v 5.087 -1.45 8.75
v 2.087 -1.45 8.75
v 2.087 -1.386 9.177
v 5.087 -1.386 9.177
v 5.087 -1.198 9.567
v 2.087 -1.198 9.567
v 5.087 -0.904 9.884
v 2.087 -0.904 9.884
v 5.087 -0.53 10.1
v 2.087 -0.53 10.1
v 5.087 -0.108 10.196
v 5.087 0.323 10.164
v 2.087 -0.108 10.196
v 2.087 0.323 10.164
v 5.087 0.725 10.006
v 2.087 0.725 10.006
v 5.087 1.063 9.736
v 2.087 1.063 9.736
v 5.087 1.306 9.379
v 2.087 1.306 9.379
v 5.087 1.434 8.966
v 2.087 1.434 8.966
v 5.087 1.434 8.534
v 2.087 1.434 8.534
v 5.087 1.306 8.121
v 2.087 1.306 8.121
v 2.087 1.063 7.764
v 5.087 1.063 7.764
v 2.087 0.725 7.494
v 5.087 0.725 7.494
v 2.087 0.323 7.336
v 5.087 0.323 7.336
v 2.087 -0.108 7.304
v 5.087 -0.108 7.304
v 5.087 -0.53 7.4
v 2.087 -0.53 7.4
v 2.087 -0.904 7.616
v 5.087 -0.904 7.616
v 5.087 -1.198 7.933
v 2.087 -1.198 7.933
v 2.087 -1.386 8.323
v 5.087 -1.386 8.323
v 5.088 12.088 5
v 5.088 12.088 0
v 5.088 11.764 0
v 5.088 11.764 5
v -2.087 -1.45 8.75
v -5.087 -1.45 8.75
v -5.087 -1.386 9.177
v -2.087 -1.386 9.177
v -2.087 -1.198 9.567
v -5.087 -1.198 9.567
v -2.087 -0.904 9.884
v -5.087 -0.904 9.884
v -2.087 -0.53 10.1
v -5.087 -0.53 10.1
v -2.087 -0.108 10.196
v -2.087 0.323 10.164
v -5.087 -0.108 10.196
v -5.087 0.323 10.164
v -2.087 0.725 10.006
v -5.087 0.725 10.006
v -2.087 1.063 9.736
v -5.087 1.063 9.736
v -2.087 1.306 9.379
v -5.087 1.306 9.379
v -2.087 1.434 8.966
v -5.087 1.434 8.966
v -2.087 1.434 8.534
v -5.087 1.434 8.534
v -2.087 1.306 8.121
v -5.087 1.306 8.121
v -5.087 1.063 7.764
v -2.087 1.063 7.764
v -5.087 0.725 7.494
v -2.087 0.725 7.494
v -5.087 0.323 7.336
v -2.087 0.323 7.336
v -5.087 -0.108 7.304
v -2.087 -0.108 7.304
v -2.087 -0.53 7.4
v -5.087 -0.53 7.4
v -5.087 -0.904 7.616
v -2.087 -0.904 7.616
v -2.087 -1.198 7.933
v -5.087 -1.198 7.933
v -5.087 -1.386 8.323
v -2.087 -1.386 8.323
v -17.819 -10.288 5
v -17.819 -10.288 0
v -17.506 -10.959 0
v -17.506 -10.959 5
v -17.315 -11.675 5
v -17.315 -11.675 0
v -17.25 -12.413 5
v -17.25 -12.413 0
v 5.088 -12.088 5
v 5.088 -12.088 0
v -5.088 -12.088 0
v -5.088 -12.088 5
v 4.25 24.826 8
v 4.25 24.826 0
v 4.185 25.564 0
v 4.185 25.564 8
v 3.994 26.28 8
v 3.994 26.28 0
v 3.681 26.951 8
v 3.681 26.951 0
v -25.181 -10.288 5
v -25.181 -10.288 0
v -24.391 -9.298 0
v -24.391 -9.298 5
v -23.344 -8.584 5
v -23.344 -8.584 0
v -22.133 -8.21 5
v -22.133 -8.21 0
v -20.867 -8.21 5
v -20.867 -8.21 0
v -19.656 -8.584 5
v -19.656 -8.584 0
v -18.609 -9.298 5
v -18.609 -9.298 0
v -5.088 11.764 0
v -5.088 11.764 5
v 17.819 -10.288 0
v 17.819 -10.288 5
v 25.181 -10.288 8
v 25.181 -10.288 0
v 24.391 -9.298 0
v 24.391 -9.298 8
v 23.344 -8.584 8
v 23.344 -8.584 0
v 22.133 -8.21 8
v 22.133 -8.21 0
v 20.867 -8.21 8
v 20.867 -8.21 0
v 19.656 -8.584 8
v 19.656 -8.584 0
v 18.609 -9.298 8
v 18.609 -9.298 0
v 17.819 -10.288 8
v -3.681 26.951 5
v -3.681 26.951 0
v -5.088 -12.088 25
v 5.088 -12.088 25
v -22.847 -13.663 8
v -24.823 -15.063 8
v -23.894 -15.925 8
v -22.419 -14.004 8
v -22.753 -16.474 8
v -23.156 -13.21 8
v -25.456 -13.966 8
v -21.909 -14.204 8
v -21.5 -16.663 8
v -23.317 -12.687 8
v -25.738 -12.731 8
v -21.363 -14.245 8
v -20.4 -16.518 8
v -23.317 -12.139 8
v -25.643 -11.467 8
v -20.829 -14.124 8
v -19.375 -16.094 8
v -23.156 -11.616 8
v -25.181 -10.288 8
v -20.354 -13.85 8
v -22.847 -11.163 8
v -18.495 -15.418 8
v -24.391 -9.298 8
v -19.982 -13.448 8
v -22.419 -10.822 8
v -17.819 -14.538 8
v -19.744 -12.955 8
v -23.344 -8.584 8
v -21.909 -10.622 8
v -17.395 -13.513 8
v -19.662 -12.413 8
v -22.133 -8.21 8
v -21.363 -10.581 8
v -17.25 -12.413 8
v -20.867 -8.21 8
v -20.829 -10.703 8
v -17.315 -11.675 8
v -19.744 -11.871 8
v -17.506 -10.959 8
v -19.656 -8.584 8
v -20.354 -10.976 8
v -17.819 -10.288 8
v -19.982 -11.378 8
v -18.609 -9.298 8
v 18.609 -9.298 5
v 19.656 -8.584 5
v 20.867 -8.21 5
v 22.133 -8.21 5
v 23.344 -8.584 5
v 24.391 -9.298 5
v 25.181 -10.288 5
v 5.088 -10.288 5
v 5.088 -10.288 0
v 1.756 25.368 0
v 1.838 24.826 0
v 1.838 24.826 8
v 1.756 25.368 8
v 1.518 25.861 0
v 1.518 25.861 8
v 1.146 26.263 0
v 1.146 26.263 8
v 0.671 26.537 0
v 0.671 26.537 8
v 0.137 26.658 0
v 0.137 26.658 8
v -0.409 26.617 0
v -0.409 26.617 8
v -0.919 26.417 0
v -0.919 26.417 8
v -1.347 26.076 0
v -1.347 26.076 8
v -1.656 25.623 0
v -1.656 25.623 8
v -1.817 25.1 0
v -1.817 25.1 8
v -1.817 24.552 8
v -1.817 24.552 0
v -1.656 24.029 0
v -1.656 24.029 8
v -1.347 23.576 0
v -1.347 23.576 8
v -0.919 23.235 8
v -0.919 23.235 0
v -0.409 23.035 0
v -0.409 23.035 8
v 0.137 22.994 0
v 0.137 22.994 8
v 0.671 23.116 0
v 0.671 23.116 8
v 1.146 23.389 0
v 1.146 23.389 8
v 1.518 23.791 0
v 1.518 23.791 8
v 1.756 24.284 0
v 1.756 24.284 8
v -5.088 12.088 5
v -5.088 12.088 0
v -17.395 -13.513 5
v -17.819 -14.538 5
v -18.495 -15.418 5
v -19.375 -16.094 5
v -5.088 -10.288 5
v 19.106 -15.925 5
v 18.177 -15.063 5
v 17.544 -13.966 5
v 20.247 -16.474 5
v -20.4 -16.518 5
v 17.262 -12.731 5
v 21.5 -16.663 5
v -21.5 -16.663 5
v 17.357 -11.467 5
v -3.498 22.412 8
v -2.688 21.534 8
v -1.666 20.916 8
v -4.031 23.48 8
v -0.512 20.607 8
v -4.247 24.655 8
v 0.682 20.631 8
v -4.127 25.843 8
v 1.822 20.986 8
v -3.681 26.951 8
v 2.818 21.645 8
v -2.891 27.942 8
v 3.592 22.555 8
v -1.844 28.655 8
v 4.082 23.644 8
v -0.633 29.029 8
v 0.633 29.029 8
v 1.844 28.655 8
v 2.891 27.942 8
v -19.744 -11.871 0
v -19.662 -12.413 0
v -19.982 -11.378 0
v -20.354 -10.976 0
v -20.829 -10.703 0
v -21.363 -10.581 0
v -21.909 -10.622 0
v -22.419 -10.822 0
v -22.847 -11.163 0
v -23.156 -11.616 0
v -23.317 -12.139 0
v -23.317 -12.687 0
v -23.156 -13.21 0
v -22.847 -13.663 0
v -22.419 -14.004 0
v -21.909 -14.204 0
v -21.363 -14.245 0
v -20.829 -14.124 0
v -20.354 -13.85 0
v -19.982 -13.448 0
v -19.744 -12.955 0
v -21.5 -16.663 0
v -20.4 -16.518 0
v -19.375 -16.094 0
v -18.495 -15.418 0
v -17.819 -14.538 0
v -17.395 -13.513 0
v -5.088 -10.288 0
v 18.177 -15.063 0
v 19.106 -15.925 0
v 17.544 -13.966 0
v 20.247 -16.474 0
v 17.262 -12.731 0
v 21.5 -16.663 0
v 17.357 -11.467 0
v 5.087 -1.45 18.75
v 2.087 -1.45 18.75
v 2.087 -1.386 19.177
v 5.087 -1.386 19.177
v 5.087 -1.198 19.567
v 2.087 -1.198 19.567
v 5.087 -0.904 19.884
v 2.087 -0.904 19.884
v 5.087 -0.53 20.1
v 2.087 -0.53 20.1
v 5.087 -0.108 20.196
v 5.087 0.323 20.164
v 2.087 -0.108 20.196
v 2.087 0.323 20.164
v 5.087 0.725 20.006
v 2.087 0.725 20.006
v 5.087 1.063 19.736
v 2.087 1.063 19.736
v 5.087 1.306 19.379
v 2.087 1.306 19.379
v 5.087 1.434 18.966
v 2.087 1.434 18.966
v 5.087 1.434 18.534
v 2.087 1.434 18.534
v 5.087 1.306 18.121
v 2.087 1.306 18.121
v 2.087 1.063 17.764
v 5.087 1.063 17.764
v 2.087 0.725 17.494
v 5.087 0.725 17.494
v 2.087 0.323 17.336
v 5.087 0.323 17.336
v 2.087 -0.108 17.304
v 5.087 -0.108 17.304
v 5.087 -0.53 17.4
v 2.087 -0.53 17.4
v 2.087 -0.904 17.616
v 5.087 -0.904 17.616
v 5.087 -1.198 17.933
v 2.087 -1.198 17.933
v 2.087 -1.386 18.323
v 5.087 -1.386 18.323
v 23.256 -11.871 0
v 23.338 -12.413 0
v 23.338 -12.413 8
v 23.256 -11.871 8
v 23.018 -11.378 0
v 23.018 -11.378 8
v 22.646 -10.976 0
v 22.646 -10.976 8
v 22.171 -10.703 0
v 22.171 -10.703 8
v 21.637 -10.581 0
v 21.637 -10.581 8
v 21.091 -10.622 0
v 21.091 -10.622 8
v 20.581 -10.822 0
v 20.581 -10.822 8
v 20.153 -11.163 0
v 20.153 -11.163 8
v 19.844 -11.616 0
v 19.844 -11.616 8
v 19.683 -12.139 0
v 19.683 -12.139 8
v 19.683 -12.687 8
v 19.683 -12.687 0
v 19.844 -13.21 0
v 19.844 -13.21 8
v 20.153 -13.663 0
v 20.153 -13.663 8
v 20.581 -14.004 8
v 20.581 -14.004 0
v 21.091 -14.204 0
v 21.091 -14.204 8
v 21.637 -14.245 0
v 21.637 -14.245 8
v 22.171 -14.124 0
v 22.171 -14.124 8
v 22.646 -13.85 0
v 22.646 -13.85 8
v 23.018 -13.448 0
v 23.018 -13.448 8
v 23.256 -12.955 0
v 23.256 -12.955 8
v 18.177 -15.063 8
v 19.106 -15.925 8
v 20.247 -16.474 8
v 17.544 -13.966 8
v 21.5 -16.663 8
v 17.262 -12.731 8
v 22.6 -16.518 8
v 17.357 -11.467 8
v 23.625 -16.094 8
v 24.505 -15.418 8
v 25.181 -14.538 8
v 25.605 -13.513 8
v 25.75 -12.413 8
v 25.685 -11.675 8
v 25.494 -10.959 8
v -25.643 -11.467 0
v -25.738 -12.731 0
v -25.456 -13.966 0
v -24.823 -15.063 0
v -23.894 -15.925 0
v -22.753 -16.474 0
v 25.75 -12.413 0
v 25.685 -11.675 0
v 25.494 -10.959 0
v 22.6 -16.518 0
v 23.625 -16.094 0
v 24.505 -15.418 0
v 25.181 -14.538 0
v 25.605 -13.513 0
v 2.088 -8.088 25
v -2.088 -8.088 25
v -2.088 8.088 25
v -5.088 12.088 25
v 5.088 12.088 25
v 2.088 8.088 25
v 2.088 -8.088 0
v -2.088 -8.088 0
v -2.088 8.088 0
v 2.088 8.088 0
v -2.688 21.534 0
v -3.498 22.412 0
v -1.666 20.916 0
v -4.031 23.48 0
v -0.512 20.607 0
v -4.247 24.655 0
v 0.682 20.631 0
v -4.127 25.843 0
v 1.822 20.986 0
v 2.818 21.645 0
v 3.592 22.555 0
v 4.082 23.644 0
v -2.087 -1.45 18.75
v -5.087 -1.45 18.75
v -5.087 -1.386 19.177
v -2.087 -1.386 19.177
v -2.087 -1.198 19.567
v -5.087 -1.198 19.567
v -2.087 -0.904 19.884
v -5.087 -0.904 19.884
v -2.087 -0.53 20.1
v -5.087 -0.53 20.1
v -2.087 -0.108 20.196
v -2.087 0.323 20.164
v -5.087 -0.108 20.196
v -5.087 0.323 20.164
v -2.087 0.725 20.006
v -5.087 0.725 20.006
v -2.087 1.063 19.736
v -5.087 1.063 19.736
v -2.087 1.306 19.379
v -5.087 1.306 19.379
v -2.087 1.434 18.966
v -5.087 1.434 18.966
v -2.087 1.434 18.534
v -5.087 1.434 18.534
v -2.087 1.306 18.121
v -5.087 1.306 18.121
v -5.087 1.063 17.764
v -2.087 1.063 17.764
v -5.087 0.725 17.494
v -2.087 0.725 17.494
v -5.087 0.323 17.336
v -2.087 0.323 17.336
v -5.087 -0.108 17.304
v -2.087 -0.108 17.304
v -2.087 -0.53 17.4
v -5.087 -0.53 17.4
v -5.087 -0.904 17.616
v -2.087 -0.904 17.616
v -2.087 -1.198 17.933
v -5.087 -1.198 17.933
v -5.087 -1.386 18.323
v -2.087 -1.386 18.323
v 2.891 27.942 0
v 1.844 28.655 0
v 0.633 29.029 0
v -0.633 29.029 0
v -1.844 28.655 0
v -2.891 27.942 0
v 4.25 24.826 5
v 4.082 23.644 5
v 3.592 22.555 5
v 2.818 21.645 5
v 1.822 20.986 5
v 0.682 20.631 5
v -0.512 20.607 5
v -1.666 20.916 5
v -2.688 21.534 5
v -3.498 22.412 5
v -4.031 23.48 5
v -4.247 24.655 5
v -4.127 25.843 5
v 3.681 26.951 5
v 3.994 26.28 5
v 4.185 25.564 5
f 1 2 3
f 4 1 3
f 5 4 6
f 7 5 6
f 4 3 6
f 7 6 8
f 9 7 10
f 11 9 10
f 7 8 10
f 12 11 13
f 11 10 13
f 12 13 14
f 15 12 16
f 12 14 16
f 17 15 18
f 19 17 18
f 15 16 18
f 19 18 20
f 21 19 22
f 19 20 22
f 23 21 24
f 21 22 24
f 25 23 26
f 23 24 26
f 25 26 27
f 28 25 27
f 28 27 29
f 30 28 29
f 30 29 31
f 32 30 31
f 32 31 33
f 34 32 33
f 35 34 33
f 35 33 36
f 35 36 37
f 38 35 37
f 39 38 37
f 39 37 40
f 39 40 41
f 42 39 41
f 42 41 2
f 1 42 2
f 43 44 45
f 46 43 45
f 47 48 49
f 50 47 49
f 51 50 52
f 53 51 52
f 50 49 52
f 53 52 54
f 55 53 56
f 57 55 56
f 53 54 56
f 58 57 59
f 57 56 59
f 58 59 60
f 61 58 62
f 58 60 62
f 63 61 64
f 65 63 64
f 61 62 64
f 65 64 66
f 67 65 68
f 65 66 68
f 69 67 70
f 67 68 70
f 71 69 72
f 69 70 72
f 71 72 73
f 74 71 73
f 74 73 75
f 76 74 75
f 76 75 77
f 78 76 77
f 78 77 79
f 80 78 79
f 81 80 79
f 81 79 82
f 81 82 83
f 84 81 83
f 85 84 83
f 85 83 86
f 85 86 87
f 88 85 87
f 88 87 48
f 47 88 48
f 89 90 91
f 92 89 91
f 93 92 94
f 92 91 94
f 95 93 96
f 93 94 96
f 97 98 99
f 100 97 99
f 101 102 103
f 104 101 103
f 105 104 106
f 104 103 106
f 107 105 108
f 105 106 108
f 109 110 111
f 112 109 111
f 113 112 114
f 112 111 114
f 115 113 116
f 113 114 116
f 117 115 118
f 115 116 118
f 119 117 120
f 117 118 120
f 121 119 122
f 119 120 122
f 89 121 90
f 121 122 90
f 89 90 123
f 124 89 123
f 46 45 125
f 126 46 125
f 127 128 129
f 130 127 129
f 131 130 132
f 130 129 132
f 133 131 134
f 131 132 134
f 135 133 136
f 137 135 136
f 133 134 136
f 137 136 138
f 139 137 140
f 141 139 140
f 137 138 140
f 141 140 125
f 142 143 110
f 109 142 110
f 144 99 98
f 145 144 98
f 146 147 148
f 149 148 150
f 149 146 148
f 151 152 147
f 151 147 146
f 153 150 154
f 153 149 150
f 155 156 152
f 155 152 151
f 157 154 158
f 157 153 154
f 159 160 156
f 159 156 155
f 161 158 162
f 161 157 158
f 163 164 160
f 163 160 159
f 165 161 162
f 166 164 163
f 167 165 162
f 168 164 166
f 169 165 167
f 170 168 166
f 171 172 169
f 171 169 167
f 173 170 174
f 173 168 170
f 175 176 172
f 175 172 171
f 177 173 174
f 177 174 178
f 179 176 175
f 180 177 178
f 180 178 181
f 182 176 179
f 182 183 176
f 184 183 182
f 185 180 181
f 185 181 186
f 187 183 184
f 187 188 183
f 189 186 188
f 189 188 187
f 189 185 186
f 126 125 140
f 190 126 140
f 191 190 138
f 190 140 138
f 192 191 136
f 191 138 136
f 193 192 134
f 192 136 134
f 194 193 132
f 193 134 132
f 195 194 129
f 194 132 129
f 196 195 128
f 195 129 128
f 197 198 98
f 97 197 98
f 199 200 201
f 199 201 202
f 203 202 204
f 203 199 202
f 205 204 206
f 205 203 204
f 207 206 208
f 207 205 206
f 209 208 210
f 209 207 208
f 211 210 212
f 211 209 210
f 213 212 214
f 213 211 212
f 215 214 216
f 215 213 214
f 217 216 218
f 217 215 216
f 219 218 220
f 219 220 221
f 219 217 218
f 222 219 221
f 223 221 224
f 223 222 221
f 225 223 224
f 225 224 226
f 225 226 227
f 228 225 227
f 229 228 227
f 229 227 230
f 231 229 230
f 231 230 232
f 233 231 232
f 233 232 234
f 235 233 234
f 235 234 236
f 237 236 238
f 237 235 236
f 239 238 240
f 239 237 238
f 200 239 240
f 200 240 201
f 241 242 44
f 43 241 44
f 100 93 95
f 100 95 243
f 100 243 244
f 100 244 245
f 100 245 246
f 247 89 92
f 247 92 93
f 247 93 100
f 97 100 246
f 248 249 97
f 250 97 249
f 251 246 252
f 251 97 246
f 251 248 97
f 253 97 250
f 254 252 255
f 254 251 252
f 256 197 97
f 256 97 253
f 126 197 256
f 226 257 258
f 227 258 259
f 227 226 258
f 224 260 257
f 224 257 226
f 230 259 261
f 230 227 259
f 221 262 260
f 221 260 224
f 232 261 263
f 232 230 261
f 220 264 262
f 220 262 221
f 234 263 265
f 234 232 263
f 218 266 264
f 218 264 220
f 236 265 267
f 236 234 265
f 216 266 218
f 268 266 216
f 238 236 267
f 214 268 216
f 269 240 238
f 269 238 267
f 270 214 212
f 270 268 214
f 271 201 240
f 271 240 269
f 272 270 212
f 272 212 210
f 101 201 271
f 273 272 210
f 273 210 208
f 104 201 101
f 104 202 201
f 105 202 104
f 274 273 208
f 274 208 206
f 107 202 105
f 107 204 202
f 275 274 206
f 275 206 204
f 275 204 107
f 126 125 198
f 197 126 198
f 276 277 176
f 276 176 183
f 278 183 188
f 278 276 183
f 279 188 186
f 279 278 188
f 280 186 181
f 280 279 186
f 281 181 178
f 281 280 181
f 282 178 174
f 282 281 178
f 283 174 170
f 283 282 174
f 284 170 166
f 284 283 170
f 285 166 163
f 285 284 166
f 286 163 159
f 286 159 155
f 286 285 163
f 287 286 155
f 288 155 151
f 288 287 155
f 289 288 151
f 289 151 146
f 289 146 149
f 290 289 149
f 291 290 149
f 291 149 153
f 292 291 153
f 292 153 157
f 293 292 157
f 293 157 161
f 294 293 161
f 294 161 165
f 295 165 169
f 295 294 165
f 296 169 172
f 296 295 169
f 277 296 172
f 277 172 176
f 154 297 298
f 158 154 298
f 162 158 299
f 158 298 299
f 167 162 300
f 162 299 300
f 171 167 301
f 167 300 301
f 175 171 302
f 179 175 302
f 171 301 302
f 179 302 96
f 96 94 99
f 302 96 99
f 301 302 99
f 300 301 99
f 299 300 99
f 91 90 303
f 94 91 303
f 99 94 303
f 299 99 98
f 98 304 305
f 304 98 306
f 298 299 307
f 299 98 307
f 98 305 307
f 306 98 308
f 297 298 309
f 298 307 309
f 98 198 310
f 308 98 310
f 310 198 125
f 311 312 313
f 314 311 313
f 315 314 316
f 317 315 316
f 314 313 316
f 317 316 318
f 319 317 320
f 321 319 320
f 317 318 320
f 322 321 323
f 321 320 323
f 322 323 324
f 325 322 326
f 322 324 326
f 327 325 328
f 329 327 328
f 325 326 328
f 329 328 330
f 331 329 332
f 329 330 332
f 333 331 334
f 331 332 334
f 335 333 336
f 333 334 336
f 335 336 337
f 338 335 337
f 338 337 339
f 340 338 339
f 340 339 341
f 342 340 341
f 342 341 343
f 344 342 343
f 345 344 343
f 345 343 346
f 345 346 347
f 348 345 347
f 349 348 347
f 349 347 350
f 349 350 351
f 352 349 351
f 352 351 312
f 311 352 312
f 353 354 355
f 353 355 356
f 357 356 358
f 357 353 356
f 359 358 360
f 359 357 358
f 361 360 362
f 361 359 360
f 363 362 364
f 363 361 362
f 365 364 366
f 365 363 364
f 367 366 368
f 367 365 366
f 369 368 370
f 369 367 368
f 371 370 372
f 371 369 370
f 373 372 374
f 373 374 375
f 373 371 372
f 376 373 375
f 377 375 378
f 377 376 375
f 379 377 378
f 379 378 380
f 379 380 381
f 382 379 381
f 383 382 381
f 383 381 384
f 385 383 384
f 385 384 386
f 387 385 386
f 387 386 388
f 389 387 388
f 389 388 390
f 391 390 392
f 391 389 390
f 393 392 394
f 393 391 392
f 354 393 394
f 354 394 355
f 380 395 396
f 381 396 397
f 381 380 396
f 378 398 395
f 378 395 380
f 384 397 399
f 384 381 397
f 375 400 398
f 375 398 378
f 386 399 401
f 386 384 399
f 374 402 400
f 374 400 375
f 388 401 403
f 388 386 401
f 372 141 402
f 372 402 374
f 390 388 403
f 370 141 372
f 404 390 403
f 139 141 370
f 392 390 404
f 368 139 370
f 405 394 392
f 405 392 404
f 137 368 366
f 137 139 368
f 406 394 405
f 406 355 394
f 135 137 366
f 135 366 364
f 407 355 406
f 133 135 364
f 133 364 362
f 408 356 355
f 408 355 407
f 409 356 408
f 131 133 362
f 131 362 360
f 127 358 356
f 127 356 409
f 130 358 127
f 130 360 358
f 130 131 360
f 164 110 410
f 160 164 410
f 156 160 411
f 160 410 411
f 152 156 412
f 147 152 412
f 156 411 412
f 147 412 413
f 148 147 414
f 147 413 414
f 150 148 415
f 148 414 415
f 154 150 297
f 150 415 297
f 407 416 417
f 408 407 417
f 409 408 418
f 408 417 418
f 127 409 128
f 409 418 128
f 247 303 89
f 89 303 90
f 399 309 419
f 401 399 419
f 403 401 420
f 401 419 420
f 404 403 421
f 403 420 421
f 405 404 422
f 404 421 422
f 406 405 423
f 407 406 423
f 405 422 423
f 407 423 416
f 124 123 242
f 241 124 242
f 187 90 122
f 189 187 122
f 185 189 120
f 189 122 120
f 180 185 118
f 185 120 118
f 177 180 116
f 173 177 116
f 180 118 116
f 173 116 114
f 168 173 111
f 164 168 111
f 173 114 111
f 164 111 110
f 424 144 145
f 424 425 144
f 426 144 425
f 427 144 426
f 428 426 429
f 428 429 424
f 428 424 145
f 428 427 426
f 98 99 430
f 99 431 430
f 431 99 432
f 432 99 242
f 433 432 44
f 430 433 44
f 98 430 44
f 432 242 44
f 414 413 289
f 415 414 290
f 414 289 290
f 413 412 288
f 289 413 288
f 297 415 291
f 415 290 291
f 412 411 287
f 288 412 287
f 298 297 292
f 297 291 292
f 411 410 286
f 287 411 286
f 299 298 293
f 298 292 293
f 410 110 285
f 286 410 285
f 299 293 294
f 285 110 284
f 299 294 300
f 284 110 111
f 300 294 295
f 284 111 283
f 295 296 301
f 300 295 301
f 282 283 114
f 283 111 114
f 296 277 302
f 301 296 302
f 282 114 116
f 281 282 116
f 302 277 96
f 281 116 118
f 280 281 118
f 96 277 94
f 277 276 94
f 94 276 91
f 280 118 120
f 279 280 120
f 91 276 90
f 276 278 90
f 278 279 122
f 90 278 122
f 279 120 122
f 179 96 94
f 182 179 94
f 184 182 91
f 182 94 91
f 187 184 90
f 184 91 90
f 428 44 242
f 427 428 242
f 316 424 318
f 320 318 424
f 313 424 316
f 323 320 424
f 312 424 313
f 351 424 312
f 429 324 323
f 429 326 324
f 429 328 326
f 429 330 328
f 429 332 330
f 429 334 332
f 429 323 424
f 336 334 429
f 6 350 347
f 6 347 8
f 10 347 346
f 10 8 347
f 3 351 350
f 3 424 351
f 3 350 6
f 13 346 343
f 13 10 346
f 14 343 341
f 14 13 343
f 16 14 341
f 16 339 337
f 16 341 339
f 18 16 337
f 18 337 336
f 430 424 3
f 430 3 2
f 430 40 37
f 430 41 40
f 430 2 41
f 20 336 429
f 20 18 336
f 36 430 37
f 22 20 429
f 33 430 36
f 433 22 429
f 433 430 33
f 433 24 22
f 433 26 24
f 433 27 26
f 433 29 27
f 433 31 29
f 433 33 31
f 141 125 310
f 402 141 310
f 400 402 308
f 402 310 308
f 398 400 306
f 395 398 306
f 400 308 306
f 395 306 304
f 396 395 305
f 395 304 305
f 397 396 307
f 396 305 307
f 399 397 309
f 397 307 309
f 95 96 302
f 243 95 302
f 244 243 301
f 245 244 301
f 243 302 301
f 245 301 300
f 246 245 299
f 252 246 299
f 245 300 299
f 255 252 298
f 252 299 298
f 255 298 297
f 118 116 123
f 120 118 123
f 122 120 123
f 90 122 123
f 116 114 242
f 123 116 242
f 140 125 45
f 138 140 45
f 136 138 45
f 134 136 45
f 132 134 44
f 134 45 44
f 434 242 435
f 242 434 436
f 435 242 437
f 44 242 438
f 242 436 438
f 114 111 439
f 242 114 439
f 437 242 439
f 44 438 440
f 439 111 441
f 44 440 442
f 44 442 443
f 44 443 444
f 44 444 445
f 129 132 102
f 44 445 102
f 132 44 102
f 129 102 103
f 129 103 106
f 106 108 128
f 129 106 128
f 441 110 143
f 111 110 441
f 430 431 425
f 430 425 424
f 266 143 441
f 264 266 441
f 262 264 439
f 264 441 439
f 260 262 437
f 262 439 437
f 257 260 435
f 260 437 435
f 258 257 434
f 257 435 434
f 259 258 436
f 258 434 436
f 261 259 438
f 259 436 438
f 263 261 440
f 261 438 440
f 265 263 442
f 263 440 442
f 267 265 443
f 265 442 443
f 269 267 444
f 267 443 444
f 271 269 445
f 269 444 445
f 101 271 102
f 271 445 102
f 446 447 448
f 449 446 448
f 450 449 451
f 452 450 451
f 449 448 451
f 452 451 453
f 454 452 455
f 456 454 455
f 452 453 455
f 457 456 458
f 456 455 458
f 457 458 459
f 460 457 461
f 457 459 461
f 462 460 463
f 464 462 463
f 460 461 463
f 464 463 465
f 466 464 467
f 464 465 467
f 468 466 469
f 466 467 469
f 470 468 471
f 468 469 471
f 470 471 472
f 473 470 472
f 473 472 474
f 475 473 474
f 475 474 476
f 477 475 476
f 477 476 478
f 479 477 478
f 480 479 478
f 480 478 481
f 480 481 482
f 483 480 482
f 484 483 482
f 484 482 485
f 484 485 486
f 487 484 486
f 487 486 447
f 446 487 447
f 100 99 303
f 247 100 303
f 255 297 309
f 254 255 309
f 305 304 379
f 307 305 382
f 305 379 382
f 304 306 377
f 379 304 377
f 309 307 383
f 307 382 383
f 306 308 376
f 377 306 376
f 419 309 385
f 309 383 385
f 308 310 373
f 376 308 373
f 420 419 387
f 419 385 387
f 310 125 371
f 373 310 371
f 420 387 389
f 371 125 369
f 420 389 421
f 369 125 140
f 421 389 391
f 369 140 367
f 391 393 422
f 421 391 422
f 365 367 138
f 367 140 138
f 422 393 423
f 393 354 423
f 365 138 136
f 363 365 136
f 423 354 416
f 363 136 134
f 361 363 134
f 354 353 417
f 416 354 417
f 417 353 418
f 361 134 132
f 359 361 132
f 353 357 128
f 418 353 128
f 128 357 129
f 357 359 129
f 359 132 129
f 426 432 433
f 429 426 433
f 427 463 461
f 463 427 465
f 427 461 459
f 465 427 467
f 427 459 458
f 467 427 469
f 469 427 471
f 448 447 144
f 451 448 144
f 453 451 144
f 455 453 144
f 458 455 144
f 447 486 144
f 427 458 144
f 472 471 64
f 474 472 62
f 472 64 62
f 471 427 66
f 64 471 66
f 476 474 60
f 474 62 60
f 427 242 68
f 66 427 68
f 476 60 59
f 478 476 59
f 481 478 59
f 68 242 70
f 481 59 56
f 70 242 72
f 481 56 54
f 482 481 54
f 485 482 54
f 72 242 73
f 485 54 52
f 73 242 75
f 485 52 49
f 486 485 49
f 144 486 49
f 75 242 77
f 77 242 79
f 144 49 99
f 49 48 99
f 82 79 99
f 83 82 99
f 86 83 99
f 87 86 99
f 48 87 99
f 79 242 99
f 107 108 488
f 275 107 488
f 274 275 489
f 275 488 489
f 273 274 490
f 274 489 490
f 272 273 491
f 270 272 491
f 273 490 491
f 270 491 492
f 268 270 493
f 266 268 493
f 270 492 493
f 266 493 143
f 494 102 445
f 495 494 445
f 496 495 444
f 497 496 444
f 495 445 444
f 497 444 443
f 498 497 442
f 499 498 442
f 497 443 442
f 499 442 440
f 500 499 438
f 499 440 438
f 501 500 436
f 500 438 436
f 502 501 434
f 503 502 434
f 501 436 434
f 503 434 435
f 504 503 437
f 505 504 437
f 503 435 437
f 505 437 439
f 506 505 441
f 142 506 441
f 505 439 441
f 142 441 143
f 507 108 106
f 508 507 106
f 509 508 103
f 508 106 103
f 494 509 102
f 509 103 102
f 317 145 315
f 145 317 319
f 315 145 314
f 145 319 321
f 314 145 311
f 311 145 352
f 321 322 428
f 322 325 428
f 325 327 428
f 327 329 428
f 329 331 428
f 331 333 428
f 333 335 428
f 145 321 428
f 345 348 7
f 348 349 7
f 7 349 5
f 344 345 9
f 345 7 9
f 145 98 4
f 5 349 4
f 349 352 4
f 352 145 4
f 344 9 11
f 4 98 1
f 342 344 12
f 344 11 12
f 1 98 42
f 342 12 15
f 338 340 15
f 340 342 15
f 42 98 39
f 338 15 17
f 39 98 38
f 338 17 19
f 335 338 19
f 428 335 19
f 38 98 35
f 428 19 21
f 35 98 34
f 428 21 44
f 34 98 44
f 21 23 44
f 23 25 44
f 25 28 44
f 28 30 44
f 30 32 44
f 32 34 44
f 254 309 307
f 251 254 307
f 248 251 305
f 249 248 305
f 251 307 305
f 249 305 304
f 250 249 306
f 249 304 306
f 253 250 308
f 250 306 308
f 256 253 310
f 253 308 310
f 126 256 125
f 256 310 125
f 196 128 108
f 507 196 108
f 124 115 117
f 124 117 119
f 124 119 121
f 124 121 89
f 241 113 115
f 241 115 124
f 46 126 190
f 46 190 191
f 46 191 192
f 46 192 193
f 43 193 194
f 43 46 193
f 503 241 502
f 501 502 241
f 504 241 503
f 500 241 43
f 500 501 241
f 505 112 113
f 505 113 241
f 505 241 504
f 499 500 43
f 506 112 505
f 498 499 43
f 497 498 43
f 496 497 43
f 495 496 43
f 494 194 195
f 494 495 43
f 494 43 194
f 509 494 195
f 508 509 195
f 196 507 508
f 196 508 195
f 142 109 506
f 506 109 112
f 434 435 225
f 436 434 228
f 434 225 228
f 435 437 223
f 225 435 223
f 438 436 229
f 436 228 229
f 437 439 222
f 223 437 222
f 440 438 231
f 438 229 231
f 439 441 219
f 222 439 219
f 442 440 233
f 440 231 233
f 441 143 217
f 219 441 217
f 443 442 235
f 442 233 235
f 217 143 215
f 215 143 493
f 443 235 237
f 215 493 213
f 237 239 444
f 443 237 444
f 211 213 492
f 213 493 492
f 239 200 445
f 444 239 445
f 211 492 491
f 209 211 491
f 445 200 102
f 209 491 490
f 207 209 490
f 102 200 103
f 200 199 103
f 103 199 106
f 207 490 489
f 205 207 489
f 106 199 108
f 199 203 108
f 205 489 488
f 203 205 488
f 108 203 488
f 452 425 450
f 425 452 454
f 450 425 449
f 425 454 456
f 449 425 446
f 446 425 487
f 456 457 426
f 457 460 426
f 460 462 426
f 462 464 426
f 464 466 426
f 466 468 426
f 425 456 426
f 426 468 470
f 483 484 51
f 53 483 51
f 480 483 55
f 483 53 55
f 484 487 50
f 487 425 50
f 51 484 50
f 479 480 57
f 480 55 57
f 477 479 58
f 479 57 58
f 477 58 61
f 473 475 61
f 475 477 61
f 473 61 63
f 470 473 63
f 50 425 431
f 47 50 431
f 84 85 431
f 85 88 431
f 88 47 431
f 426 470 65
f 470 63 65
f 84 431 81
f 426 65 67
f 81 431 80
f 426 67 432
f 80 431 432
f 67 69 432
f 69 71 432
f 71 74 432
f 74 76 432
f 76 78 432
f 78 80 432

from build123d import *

# Parameters (mm, degrees)
F0_DEPTH = 5
F3_R     = 1.8375
F4_DEPTH = 8
F3_W     = 4.175
F3_H     = 16.175
F1_DEPTH = 25
F2_D     = 2.9
F6_D     = 2.9


with BuildPart() as f0:
    # F3 (on Top) → F0 (new body)
    with BuildSketch(Plane.XY):
        with BuildLine():
            Line((-21.5, -16.663031), (21.5, -16.663031))
            ThreePointArc((21.5, -16.663031), (17.819392, -14.538031), (17.819392, -10.288031))
            Line((17.819392, -10.288031), (5.0875, -10.288031))
            Line((5.0875, -10.288031), (5.0875, -12.0875))
            Line((5.0875, -12.0875), (-5.0875, -12.0875))
            Line((-5.0875, -12.0875), (-5.0875, -10.288031))
            Line((-5.0875, -10.288031), (-17.819392, -10.288031))
            ThreePointArc((-17.819392, -10.288031), (-17.394815, -11.31305), (-17.25, -12.413031))
            ThreePointArc((-17.25, -12.413031), (-18.494796, -15.418235), (-21.5, -16.663031))
        make_face()
        with BuildLine():
            ThreePointArc((17.819392, -10.288031), (21.5, -8.163031), (25.180608, -10.288031))
            Line((25.180608, -10.288031), (3.680608, 26.951062))
            ThreePointArc((3.680608, 26.951062), (4.105185, 25.926043), (4.25, 24.826062))
            ThreePointArc((4.25, 24.826062), (-1.099981, 20.720877), (-3.680608, 26.951062))
            Line((-3.680608, 26.951062), (-25.180608, -10.288031))
            ThreePointArc((-25.180608, -10.288031), (-21.5, -8.163031), (-17.819392, -10.288031))
            Line((-17.819392, -10.288031), (-5.0875, 11.764253))
            Line((-5.0875, 11.764253), (-5.0875, 12.0875))
            Line((-5.0875, 12.0875), (5.0875, 12.0875))
            Line((5.0875, 12.0875), (5.0875, 11.764253))
            Line((5.0875, 11.764253), (17.819392, -10.288031))
        make_face()
    extrude(amount=F0_DEPTH)


with BuildPart() as f4:
    # F3 (on Top) → F4 (new body)
    with BuildSketch(Plane.XY):
        with BuildLine():
            ThreePointArc((21.5, -16.663031), (24.505204, -15.418235), (25.75, -12.413031))
            ThreePointArc((25.75, -12.413031), (25.605185, -11.31305), (25.180608, -10.288031))
            ThreePointArc((25.180608, -10.288031), (21.5, -8.163031), (17.819392, -10.288031))
            ThreePointArc((17.819392, -10.288031), (17.819392, -14.538031), (21.5, -16.663031))
        make_face()
        with Locations((21.5, -12.413031)):
            Circle(F3_R, mode=Mode.SUBTRACT)
        with BuildLine():
            ThreePointArc((4.25, 24.826062), (4.105185, 25.926043), (3.680608, 26.951062))
            ThreePointArc((3.680608, 26.951062), (0, 29.076062), (-3.680608, 26.951062))
            ThreePointArc((-3.680608, 26.951062), (-1.099981, 20.720877), (4.25, 24.826062))
        make_face()
        with Locations((0, 24.826062)):
            Circle(F3_R, mode=Mode.SUBTRACT)
        with BuildLine():
            ThreePointArc((-25.180608, -10.288031), (-25.180608, -14.538031), (-21.5, -16.663031))
            ThreePointArc((-21.5, -16.663031), (-18.494796, -15.418235), (-17.25, -12.413031))
            ThreePointArc((-17.25, -12.413031), (-17.394815, -11.31305), (-17.819392, -10.288031))
            ThreePointArc((-17.819392, -10.288031), (-21.5, -8.163031), (-25.180608, -10.288031))
        make_face()
        with Locations((-21.5, -12.413031)):
            Circle(F3_R, mode=Mode.SUBTRACT)
    extrude(amount=F4_DEPTH)


with BuildPart() as f1:
    # F3 (on Top) → F1 (new body)
    with BuildSketch(Plane.XY):
        Polygon((5.0875, -10.288031), (5.0875, 11.764253), (5.0875, 12.0875), (-5.0875, 12.0875), (-5.0875, 11.764253), (-5.0875, -10.288031), (-5.0875, -12.0875), (5.0875, -12.0875), align=None)
        Rectangle(F3_W, F3_H, mode=Mode.SUBTRACT)
    extrude(amount=F1_DEPTH)

    # F2 (through all)
    with Locations(Plane.YZ.offset(5.0875)):
        with Locations((0, 18.75)):
            Hole(F2_D / 2)

    # F6 (through all)
    with Locations(Plane.YZ.offset(5.0875)):
        with Locations((0, 8.75)):
            Hole(F6_D / 2)


solid = Compound([f0.part, f4.part, f1.part])
